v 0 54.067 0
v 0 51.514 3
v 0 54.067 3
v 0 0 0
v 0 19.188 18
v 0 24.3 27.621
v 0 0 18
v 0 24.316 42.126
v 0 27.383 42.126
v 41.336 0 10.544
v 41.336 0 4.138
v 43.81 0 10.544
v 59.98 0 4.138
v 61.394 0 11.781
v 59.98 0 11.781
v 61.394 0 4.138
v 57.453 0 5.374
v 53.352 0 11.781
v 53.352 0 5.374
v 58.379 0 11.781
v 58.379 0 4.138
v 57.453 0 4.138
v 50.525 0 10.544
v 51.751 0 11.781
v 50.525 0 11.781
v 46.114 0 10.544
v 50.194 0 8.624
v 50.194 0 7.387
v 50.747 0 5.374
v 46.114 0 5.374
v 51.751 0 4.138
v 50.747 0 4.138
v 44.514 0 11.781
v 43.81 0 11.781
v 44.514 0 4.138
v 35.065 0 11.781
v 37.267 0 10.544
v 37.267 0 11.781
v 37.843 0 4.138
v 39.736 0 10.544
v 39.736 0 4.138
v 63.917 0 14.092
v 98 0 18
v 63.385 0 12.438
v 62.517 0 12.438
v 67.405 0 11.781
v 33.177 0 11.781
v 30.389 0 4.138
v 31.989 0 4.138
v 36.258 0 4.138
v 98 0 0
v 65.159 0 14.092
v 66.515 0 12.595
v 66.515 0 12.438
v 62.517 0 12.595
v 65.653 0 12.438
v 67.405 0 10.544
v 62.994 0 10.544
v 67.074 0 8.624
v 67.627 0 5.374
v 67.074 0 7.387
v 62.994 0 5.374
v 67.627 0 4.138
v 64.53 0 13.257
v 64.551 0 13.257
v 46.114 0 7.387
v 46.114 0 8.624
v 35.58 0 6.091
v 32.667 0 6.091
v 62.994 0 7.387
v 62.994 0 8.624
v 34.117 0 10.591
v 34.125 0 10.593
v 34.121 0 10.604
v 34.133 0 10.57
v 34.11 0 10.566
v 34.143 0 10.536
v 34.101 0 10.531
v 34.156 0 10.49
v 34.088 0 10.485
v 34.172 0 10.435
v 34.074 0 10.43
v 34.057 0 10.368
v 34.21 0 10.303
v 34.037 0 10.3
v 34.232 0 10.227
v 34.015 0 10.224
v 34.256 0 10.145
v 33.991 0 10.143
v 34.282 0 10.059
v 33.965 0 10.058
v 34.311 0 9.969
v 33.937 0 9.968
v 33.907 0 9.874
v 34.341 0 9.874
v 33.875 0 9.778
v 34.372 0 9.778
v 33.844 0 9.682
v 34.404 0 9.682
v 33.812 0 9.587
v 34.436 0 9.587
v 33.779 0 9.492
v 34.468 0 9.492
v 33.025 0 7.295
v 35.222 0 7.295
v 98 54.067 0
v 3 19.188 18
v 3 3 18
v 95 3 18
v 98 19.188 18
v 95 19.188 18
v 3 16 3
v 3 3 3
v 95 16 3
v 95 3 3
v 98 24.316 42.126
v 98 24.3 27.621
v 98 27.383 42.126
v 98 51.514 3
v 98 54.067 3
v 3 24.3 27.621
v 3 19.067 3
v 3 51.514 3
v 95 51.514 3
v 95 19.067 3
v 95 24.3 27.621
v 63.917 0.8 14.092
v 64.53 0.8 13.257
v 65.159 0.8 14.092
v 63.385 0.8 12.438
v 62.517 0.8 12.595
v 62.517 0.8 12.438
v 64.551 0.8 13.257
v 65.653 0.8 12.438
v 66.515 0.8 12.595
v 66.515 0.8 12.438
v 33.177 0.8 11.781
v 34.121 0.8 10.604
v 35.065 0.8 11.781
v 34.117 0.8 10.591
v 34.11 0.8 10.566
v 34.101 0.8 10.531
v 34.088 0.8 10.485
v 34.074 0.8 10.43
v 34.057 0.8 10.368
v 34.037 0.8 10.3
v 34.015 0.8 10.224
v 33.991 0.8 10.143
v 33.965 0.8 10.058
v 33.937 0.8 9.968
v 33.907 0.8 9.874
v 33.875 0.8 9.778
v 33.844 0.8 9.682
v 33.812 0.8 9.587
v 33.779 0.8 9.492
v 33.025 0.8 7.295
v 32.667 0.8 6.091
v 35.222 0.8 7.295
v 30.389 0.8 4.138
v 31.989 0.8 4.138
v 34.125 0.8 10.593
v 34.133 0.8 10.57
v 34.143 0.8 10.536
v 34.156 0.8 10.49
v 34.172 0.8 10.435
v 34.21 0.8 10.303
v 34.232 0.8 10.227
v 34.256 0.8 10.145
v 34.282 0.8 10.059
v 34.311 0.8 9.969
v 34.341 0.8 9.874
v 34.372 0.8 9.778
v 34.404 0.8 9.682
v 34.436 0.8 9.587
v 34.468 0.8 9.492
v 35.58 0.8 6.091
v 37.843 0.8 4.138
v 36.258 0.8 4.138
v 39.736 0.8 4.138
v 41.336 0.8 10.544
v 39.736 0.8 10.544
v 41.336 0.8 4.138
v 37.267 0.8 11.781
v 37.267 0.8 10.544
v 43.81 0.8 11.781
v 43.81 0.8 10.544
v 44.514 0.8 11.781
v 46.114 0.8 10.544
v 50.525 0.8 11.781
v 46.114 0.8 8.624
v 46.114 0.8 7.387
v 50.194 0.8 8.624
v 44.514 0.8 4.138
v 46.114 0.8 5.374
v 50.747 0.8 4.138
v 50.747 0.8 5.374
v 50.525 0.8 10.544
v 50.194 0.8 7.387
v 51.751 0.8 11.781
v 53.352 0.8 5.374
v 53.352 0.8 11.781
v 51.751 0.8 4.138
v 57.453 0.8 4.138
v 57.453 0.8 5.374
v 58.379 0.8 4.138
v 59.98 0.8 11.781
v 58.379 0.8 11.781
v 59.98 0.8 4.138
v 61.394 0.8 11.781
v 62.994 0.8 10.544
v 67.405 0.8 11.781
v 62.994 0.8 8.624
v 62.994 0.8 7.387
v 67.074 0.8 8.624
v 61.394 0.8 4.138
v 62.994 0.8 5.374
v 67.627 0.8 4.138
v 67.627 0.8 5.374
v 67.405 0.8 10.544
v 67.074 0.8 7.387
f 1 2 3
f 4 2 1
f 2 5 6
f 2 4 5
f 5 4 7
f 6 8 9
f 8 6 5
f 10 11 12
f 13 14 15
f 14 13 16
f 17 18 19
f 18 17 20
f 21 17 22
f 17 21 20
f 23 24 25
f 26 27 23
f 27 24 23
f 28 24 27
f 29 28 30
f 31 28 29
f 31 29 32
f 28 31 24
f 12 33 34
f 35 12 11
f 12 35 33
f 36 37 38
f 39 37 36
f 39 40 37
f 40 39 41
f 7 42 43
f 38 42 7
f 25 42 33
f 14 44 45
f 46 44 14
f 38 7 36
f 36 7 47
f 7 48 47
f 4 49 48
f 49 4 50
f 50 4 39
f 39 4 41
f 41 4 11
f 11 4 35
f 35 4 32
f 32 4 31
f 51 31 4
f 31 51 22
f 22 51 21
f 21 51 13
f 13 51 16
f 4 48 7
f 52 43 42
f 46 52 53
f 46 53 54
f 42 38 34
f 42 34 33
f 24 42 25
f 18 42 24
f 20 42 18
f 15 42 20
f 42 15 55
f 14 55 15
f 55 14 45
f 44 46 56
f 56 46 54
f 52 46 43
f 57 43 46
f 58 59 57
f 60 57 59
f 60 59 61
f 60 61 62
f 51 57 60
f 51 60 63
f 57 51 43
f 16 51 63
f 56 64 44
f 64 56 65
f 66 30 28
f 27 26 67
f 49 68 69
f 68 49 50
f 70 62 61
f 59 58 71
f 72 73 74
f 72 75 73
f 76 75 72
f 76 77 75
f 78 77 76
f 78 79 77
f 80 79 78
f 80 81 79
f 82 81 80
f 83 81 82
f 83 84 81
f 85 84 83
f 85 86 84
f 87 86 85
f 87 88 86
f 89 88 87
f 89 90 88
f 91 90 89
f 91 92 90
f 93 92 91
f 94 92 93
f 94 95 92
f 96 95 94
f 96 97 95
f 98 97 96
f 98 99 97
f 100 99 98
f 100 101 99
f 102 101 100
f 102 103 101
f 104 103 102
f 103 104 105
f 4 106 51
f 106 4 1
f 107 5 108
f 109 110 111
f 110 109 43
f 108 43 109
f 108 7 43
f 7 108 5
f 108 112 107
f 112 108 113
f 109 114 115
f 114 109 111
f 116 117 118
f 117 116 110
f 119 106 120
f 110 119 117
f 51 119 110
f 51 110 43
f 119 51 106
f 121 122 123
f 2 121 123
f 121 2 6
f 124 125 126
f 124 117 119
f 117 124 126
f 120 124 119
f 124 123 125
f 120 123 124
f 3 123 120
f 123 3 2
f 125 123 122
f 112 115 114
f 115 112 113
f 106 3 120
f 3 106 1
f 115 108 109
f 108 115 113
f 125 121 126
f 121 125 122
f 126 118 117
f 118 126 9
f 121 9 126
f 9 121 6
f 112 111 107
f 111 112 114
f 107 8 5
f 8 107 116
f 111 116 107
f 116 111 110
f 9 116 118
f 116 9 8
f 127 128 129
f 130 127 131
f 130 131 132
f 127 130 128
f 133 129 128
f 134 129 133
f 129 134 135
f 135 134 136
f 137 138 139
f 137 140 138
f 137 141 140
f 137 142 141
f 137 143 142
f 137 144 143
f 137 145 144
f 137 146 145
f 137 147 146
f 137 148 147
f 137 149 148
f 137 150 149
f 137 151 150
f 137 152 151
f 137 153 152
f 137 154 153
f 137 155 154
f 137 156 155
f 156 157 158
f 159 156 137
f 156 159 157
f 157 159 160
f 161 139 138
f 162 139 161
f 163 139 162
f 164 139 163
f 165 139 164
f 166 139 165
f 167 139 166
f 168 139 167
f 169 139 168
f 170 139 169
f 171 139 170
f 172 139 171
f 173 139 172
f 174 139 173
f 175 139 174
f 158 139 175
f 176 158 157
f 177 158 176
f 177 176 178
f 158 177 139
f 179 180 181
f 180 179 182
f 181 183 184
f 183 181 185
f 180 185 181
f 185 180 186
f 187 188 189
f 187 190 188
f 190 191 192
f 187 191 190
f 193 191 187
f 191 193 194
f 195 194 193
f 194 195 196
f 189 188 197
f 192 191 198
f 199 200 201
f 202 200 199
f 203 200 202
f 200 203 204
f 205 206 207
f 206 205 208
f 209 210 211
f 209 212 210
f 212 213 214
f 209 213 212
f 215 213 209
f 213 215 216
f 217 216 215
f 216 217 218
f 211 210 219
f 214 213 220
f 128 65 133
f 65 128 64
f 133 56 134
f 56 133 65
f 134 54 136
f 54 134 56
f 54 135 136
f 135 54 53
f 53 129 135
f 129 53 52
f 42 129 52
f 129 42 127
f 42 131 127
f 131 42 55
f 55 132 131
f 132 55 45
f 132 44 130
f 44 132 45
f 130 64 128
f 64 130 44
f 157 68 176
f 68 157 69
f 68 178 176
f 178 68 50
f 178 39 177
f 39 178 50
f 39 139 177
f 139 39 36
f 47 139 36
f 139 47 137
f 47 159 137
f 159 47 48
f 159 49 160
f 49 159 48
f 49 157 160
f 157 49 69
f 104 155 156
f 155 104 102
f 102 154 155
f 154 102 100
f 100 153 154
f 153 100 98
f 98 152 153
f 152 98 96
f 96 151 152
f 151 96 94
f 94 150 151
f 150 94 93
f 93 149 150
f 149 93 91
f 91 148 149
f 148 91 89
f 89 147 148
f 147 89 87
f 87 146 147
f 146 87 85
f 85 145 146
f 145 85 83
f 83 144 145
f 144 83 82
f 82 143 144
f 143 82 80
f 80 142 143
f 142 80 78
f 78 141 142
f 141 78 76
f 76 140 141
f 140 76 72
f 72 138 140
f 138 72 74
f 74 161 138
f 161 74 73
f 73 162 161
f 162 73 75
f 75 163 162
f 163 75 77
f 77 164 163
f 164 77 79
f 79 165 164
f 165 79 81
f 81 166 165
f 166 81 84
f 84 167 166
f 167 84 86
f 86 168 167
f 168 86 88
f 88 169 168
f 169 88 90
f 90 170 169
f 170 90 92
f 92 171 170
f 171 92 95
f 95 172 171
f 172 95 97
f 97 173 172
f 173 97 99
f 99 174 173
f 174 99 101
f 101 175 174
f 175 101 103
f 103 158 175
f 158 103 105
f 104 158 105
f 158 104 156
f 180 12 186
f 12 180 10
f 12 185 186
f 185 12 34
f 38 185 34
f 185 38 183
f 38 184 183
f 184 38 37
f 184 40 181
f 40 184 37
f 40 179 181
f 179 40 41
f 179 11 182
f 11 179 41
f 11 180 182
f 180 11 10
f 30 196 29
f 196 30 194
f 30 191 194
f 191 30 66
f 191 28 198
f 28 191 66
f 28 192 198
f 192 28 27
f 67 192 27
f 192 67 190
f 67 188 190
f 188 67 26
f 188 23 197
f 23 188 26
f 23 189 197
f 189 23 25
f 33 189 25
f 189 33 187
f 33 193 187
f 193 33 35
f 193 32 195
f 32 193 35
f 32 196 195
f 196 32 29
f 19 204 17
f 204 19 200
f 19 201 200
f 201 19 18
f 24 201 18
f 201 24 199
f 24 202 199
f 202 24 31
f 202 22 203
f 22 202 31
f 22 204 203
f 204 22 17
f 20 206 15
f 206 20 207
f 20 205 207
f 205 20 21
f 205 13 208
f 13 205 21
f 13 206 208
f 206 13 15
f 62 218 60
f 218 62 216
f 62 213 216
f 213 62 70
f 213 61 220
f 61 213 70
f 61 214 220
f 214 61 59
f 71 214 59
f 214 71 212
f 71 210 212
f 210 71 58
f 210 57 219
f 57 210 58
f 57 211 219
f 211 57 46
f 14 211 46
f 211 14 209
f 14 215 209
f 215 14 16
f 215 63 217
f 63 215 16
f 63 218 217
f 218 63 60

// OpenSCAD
// Porta-cartao de mesa - OpenSCAD 2021.01 - unidades em mm
card_w       = 90;    // largura do cartao (mm)
card_h       = 50;    // altura do cartao (mm), referencia para back_len
stack_t      = 12;    // espessura da pilha de cartoes (mm)
clear_w      = 2;     // folga total na largura do bolso (mm)
clear_t      = 1;     // folga na espessura do bolso (mm)
wall         = 3;     // espessura das paredes (mm), minimo 2
base_t       = 3;     // espessura da base (mm)
lip_h        = 15;    // altura da aba frontal acima do piso do bolso (mm)
tilt         = 12;    // inclinacao do encosto para tras (graus)
back_len     = 40;    // comprimento do encosto ao longo da inclinacao (mm)
foot_len     = 35;    // pe atras: quanto a base passa alem do encosto (mm)
gusset_h     = 25;    // altura dos reforcos traseiros (mm)
gusset_inset = 2;     // recuo do reforco em relacao ao fim do pe (mm)
txt          = "ATELIÊ";                      // texto gravado na frente
txt_font     = "Liberation Sans:style=Bold";  // fonte do texto
txt_size     = 8;     // tamanho do texto (mm)
txt_depth    = 0.8;   // profundidade da gravacao (mm)
ovl          = 0.5;   // sobreposicao entre partes para uniao limpa (mm)
cut_extra    = 1;     // excesso do corte do texto para fora da face (mm)
half         = 0.5;   // fator de centralizacao (adimensional)
rot_up       = 90;    // rotacao para colocar perfis/texto em pe (graus)
zero         = 0;     // origem (mm)

// ---------- medidas derivadas ----------
inner_w    = card_w + clear_w;                 // largura util do bolso
W          = wall + inner_w + wall;            // largura total
slot_t     = stack_t + clear_t;                // fundo do bolso no piso
back_t     = wall / cos(tilt);                 // espessura horizontal do encosto
y_back_in  = wall + slot_t;                    // face interna do encosto no piso
y_back_out = y_back_in + back_t;               // face externa do encosto no piso
rise       = back_len * cos(tilt);             // subida vertical do encosto
run        = back_len * sin(tilt);             // avanco horizontal do encosto
D          = y_back_out + foot_len;            // profundidade total
H          = base_t + rise;                    // altura total
z_lip      = base_t + lip_h;                   // topo da aba frontal
sh         = ovl * tan(tilt);                  // deslocamento da inclinacao na sobreposicao

echo(largura = W, profundidade = D, altura = H);

// perfil 2D (y, z) extrudado ao longo de X com largura w
module prism(pts, w) {
    rotate([rot_up, zero, rot_up]) linear_extrude(height = w) polygon(pts);
}

difference() {
    union() {
        // base + pe traseiro
        cube([W, D, base_t]);

        // aba frontal
        cube([W, wall, z_lip]);

        // encosto inclinado
        prism([[y_back_in  - sh,       base_t - ovl],
               [y_back_out - sh,       base_t - ovl],
               [y_back_out + run,      H],
               [y_back_in  + run,      H]], W);

        // paredes laterais do bolso
        for (x = [zero, W - wall])
            translate([x, zero, zero])
                prism([[zero, zero],
                       [y_back_in + ovl, zero],
                       [y_back_in + ovl + lip_h * tan(tilt), z_lip],
                       [zero, z_lip]], wall);

        // reforcos triangulares entre encosto e pe
        for (x = [zero, W - wall])
            translate([x, zero, zero])
                prism([[y_back_out - ovl, base_t - ovl],
                       [D - gusset_inset, base_t - ovl],
                       [y_back_out - ovl + gusset_h * tan(tilt), base_t + gusset_h]], wall);
    }

    // texto gravado na face frontal
    translate([W * half, txt_depth, z_lip * half])
        rotate([rot_up, zero, zero])
            linear_extrude(height = txt_depth + cut_extra)
                text(txt, size = txt_size, font = txt_font,
                     halign = "center", valign = "center");
}
